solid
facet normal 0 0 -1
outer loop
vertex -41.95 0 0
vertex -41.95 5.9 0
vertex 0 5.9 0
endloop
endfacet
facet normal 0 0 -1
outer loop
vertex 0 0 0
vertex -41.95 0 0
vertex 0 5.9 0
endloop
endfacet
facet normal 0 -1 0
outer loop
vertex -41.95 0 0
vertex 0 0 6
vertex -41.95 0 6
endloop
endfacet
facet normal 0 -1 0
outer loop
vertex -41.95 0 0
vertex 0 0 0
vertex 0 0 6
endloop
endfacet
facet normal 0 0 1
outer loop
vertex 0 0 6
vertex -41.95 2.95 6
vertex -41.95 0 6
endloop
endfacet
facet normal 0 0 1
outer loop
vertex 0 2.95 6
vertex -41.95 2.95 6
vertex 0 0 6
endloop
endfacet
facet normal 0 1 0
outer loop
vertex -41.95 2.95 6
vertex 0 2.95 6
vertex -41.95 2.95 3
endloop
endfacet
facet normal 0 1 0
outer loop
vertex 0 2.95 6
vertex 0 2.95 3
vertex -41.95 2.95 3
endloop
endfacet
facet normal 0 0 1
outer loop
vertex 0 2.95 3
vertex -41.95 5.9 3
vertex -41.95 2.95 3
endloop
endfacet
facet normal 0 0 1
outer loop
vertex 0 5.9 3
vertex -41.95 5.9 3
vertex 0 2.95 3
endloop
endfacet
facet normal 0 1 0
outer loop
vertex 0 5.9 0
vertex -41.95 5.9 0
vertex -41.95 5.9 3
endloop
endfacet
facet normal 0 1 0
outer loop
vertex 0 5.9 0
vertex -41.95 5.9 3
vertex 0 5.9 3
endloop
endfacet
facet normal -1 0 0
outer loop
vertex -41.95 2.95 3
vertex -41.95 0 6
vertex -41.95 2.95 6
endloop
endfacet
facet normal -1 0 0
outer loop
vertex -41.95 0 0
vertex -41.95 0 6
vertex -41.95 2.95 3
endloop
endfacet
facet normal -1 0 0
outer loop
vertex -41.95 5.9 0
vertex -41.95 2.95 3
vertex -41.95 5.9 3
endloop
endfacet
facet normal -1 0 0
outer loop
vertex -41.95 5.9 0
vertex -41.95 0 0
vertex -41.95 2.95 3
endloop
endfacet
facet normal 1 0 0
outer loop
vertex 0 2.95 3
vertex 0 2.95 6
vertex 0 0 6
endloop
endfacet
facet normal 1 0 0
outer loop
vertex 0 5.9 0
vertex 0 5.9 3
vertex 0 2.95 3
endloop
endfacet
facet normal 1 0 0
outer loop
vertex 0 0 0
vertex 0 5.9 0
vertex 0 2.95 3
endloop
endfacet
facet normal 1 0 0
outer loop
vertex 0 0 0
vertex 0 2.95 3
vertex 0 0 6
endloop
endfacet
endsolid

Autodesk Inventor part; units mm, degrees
ref_plane "YZ Plane" through (0, 0, 0) normal (1, 0, 0) x (0, 1, 0)
ref_plane "XZ Plane" through (0, 0, 0) normal (0, 1, 0) x (-1, 0, 0)
ref_plane "XY Plane" through (0, 0, 0) normal (0, 0, 1) x (1, 0, 0)
sketch "스케치1" plane through (0, 0, 0) normal (0, 0, 1) x (1, 0, 0)
  circle A0 centre (14.75, -25.8408) radius 14.2 projected
  line L0 (41.95, 5.9) -> (41.95, -57.9408) projected
  line L1 (-41.95, 5.9) -> (41.95, 5.9) projected
  line L2 (-41.95, -57.9408) -> (-41.95, 5.9) projected
  line L3 (41.95, -57.9408) -> (-41.95, -57.9408) projected
  line L4 (-41.95, 5.9) -> (0, 5.9)
  line L5 (0, 5.9) -> (0, 0)
  line L6 (0, 0) -> (-41.95, 0)
  line L7 (-41.95, 0) -> (-41.95, 5.9)
  line L8 (-41.95, 0) -> (0, 0)
  line L9 (0, 0) -> (0, 2.95)
  line L10 (0, 2.95) -> (-41.95, 2.95)
  line L11 (-41.95, 2.95) -> (-41.95, 0)
extrude "돌출1" add sketch "스케치1" along normal blind 6 contours L5 L6 L2 L10
sketch "스케치2" plane through (-41.95, 0, 0) normal (-1, 0, 0) x (0, 0, 1)
  point P0 (0, 0)
sketch "스케치3" plane through (0, 0, 0) normal (0, 0, 1) x (1, 0, 0)
  point P0 (0, 0)
sketch "스케치4" plane through (0, 0, 0) normal (0, 0, 1) x (1, 0, 0)
  circle A0 centre (14.75, -25.8408) radius 14.2 projected
  line L0 (41.95, 5.9) -> (41.95, -57.9408) projected
  line L1 (-41.95, 5.9) -> (41.95, 5.9) projected
  line L2 (-41.95, -57.9408) -> (-41.95, 5.9) projected
  line L3 (41.95, -57.9408) -> (-41.95, -57.9408) projected
  line L4 (-41.95, 5.9) -> (0, 5.9)
  line L5 (0, 5.9) -> (0, 2.95)
  line L6 (0, 2.95) -> (-41.95, 2.95)
  line L7 (-41.95, 2.95) -> (-41.95, 5.9)
  point P0 (0, 0)
  point P1 (0, 5.9)
extrude "돌출2" add sketch "스케치4" along normal blind 3 contours L5 L6 L2 L1
properties part number "부품73"
